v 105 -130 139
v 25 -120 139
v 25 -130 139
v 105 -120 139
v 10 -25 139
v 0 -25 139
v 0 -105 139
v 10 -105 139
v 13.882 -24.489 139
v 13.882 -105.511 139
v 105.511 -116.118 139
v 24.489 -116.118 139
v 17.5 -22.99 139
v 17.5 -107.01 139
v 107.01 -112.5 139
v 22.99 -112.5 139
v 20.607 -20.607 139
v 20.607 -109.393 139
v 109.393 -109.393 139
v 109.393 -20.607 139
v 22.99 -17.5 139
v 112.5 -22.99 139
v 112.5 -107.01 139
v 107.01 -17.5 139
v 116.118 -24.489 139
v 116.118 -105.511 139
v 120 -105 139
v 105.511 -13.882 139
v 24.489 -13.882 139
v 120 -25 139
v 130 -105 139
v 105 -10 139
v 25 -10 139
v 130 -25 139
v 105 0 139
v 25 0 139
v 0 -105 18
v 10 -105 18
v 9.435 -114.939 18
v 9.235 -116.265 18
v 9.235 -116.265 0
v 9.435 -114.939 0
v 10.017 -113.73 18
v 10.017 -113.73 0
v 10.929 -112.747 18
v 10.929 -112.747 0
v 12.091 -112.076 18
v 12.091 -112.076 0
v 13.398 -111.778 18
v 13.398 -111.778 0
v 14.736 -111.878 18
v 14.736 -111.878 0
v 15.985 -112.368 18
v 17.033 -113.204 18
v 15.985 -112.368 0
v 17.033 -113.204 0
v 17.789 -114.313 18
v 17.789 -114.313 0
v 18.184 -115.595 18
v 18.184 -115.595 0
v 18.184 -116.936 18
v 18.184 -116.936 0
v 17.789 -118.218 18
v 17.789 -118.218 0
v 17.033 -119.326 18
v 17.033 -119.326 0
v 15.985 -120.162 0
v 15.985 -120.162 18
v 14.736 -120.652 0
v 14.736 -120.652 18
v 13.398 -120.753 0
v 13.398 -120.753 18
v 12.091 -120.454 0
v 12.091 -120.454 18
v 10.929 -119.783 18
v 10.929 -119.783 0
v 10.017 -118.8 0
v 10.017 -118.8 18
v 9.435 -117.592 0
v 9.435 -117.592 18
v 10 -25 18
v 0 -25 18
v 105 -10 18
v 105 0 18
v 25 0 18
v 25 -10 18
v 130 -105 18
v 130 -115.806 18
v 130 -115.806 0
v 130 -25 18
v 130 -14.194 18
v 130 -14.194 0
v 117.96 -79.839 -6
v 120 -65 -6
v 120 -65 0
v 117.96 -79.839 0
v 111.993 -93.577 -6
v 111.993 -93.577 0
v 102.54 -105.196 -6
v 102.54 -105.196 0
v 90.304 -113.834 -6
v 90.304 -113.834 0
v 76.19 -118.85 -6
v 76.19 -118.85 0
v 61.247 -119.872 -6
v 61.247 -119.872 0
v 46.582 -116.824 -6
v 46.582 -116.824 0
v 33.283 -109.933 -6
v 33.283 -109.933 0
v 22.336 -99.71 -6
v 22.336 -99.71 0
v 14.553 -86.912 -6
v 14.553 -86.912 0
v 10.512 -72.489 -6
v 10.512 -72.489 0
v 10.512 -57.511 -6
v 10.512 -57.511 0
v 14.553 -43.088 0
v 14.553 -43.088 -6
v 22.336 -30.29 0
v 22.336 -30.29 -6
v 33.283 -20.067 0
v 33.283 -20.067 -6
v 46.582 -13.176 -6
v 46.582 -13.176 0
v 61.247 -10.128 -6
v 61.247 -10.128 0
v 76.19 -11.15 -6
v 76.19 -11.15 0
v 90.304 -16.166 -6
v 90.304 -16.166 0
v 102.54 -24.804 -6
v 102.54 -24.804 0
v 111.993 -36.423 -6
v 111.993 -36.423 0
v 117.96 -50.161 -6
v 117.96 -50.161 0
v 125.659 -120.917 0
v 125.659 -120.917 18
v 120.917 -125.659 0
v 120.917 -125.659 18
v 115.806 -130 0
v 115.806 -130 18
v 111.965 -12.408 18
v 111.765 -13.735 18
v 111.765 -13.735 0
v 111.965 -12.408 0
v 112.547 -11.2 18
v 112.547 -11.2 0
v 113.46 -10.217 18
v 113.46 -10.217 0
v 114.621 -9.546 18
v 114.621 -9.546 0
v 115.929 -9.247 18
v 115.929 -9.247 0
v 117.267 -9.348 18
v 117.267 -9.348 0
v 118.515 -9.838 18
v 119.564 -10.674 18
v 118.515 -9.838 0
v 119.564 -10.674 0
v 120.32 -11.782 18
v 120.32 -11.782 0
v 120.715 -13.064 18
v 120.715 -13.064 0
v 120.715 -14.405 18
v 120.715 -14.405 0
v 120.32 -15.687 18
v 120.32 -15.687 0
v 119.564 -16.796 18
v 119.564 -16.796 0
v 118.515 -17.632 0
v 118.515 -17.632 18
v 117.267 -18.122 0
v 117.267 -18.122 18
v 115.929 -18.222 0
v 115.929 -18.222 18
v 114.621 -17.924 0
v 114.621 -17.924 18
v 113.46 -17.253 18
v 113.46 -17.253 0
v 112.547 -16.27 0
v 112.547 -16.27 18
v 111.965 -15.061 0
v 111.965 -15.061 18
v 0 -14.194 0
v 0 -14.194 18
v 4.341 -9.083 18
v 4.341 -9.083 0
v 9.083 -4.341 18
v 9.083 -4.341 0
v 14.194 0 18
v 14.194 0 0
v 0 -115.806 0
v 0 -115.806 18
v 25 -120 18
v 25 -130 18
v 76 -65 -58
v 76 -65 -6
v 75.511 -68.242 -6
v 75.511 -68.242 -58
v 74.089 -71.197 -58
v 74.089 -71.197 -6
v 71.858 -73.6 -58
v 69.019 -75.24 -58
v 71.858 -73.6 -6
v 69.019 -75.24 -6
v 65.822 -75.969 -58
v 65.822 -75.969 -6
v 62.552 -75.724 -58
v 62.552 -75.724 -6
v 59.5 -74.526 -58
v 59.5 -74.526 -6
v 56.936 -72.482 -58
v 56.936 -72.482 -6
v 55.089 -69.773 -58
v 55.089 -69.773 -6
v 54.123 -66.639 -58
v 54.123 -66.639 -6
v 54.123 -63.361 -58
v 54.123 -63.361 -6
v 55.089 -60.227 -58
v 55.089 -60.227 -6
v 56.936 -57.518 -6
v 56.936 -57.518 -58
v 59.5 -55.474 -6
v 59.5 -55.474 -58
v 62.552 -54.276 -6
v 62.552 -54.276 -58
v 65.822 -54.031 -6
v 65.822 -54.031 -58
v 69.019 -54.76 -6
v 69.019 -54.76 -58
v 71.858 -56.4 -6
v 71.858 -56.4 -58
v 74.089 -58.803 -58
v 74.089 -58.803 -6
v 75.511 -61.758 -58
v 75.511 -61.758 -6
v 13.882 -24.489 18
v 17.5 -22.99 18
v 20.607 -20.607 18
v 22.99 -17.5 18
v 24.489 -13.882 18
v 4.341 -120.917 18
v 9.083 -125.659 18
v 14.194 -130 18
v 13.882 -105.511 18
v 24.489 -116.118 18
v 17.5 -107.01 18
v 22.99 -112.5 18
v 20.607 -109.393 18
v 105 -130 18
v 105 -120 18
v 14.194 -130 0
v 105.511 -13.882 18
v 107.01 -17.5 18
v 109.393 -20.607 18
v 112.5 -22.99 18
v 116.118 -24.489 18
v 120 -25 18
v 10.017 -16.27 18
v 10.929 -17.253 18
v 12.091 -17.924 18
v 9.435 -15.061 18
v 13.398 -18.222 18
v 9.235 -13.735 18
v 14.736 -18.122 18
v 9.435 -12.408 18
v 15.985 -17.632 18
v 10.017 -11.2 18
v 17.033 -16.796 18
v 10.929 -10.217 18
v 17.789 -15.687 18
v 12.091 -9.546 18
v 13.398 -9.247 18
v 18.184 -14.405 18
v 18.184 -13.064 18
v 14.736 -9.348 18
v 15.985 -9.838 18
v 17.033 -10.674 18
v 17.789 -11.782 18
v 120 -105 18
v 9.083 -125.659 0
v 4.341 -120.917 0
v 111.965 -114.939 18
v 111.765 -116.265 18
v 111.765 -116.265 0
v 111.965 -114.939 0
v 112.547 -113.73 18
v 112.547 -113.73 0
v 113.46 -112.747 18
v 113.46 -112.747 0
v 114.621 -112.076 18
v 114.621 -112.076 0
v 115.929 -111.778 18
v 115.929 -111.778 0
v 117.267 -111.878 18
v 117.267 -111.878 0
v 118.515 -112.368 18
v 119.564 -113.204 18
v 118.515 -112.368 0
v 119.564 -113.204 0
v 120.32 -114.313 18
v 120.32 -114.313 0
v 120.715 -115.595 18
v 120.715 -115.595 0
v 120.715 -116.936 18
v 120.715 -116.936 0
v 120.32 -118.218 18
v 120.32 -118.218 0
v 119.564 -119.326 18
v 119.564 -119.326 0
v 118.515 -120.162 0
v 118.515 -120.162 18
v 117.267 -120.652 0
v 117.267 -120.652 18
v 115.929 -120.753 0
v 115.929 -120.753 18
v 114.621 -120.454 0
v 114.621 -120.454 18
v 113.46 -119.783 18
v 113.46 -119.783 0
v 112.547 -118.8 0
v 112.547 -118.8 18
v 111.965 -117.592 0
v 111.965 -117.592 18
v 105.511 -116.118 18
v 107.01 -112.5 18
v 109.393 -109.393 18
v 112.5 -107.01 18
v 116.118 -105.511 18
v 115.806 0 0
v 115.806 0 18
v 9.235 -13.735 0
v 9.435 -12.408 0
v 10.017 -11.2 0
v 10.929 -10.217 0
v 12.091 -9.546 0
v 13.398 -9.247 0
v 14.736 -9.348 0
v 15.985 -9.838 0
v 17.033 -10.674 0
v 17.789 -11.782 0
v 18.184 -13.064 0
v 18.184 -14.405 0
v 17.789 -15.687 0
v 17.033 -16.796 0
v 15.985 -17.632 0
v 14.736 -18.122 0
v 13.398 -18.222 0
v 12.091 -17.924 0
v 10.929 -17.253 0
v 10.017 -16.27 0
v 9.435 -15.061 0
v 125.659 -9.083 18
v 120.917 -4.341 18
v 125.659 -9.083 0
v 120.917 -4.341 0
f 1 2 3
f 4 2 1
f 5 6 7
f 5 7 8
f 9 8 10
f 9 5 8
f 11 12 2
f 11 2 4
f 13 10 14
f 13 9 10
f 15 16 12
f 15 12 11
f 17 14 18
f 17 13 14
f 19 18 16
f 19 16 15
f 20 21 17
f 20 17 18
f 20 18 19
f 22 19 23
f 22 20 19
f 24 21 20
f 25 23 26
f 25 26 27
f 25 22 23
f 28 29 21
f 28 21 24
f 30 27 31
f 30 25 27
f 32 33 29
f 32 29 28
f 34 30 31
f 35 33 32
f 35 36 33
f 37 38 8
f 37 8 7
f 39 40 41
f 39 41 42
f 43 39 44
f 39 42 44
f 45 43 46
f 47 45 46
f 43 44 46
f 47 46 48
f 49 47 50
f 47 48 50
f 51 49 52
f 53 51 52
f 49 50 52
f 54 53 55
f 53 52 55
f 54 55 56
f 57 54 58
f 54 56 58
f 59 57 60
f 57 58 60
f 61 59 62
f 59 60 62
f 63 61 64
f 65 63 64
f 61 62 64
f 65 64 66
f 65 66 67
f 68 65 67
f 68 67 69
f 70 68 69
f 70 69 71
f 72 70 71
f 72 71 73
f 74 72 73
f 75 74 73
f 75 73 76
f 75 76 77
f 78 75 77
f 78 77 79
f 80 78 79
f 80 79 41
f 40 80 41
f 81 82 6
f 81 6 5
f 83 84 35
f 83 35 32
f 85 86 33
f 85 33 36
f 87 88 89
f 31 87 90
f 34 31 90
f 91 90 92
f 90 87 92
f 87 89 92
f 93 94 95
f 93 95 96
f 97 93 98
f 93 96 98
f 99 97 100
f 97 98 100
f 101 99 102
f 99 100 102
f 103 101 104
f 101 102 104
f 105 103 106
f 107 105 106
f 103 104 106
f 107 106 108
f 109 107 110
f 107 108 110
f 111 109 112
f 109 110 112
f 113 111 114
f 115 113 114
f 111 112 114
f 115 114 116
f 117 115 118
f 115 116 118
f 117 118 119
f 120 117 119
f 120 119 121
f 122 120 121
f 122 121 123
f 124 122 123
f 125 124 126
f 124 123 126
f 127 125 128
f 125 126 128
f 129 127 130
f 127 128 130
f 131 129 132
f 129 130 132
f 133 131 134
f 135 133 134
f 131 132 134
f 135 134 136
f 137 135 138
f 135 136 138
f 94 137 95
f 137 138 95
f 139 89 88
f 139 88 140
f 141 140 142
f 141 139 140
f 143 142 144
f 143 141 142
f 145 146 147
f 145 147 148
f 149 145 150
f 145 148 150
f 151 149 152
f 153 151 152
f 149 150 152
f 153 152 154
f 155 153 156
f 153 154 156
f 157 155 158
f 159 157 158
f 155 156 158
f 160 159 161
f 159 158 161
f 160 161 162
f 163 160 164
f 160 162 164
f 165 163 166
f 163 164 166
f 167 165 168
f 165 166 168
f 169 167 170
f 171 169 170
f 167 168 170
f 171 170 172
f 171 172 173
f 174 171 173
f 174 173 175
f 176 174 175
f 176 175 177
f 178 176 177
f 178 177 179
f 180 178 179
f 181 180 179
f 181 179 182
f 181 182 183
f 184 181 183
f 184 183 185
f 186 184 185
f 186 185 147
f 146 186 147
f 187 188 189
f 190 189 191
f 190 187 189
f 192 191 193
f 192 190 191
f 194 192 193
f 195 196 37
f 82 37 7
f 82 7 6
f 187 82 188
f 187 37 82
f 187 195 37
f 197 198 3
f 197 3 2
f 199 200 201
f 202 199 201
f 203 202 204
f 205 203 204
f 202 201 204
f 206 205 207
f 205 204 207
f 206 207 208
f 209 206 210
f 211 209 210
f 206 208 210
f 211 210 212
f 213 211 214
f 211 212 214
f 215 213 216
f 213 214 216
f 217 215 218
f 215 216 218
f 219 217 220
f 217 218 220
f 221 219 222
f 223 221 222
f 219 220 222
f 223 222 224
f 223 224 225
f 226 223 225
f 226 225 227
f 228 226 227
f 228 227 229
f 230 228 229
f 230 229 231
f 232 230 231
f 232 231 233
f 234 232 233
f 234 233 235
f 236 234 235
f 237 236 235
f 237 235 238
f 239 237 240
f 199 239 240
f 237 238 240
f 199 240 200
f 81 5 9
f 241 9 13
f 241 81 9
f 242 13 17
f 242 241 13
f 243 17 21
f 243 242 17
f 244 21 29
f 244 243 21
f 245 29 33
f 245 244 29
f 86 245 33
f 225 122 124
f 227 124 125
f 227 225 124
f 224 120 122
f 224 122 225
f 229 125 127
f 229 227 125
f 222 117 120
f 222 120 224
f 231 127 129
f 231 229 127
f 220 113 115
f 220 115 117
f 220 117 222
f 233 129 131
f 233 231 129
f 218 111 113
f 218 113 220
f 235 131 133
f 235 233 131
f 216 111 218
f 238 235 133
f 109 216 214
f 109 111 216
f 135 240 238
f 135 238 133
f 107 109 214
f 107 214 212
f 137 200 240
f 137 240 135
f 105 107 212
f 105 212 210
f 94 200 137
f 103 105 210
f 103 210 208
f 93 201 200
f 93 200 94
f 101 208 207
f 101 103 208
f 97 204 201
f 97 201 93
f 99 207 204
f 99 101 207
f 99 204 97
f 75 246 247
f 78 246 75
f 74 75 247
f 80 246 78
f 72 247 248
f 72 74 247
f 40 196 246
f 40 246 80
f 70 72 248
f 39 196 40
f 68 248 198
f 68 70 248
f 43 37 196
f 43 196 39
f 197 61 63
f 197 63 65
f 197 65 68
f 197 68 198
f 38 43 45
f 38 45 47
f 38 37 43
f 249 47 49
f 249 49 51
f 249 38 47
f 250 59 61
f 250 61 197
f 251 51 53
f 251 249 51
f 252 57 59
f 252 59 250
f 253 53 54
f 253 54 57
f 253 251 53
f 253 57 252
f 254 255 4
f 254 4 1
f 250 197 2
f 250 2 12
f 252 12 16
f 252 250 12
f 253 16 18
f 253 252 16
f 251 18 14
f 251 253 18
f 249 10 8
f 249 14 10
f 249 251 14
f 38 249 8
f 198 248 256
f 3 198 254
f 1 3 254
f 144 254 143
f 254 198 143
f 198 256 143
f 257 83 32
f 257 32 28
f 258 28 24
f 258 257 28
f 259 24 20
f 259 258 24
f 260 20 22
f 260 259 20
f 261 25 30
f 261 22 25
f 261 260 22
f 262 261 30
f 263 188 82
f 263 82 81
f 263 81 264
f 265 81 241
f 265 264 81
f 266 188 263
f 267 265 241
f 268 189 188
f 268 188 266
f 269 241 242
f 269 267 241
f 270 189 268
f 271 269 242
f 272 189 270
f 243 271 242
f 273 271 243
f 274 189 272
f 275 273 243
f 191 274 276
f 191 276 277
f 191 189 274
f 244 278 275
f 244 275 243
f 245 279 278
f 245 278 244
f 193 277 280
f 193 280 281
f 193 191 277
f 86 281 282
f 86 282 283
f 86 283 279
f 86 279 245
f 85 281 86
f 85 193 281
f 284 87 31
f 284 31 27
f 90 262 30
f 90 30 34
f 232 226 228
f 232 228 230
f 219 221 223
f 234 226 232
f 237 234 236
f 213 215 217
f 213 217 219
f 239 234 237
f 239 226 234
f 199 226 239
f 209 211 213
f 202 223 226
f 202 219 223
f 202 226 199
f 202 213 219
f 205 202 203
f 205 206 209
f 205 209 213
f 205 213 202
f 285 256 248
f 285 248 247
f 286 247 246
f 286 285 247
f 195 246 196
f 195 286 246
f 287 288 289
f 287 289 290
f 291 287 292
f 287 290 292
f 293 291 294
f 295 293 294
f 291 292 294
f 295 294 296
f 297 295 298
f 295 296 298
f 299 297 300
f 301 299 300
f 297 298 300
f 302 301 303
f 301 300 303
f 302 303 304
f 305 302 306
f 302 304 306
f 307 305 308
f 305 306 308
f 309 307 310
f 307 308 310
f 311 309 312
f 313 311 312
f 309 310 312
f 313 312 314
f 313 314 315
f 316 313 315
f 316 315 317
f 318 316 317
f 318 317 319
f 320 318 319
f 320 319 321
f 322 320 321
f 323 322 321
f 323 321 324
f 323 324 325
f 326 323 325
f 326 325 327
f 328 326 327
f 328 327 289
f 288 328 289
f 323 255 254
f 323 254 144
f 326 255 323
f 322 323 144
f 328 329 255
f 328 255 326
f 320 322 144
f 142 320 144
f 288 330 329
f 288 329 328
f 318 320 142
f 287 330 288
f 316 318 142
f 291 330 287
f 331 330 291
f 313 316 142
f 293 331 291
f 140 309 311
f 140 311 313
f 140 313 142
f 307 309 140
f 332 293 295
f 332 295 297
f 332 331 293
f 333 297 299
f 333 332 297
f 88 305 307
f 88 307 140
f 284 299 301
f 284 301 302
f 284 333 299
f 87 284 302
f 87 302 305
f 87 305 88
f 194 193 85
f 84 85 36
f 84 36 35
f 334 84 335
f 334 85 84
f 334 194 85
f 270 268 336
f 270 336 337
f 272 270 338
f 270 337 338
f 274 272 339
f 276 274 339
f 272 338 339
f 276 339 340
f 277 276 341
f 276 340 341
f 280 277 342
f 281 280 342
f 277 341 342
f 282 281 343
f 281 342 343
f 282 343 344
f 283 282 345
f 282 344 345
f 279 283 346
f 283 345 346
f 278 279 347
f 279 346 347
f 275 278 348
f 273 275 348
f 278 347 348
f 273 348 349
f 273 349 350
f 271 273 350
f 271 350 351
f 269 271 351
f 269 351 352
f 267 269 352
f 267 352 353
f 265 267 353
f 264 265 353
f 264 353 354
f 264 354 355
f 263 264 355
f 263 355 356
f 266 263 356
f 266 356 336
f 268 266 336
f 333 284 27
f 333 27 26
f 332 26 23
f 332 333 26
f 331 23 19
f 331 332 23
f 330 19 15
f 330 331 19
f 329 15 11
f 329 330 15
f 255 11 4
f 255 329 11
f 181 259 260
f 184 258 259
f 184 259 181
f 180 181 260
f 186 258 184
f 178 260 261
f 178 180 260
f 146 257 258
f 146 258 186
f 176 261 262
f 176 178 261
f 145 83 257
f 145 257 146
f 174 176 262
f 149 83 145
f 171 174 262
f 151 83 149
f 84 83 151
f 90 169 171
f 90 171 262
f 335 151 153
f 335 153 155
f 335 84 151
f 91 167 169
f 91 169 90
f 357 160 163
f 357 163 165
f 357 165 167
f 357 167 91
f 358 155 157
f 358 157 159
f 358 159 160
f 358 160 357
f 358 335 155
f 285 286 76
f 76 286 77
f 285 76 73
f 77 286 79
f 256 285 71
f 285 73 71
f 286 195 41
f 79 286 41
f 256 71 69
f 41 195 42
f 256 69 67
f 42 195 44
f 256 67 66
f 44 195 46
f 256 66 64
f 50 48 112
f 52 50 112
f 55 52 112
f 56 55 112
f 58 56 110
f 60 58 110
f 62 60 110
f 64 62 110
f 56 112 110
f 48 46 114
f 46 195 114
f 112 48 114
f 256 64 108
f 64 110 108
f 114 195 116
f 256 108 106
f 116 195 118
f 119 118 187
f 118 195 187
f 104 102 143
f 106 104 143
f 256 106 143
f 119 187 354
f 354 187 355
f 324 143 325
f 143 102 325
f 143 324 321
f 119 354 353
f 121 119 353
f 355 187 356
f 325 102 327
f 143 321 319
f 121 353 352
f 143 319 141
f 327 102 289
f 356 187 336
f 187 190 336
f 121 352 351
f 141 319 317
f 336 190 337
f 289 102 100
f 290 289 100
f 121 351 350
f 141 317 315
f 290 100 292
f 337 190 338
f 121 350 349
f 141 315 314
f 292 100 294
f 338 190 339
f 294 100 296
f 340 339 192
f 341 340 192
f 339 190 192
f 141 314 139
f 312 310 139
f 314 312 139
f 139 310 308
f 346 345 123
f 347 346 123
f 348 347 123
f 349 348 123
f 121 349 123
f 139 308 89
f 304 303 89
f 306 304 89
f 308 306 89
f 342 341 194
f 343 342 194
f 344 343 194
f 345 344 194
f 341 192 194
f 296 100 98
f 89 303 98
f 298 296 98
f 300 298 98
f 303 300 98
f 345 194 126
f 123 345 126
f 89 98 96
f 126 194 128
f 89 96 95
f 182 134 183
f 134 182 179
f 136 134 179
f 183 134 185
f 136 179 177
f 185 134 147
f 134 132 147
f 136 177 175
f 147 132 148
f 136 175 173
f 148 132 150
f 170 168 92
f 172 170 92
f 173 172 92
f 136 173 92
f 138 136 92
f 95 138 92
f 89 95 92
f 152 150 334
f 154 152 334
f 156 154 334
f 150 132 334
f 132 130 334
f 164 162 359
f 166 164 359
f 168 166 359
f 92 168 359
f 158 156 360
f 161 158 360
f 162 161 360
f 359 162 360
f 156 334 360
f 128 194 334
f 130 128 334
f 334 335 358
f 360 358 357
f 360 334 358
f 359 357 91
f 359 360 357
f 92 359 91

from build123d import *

# Parameters (mm, degrees)
SKETCH_1_W          = 130
SKETCH_1_H          = 130
EXTRUDE_1_DEPTH     = 139
SKETCH_2_R          = 55
EXTRUDE_2_DEPTH     = 6
SKETCH_3_R          = 11
EXTRUDE_3_DEPTH     = 52
SKETCH_5_R          = 4.5
CUT_EXTRUDE_2_DEPTH = 137
CUT_EXTRUDE_5_DEPTH = 221.093162093
SKETCH_10_OUTSIDE_W = 185.892
SKETCH_10_OUTSIDE_H = 185.892
SKETCH_10_OUTSIDE_R = 82.5
CUT_EXTRUDE_6_DEPTH = 231.479934051


with BuildPart() as part:
    # 草图1 → 拉伸1 (new body)
    with BuildSketch(Plane.XY):
        with Locations((65, -65)):
            Rectangle(SKETCH_1_W, SKETCH_1_H)
    extrude(amount=EXTRUDE_1_DEPTH)

    # 草图2 → 拉伸2 (add)
    with BuildSketch(Plane(origin=(0, 0, 0), x_dir=(-1, 0, 0), z_dir=(0, 0, -1))):
        with Locations(Location((-65, -65, 0), (0, 0, 180))):
            Circle(SKETCH_2_R)
    extrude(amount=EXTRUDE_2_DEPTH)

    # 草图3 → 拉伸3 (add)
    with BuildSketch(Plane(origin=(0, 0, -6), x_dir=(-1, 0, 0), z_dir=(0, 0, -1))):
        with Locations(Location((-65, -65, 0), (0, 0, 180))):
            Circle(SKETCH_3_R)
    extrude(amount=EXTRUDE_3_DEPTH)

    # 草图5 → 切除-拉伸2 (cut)
    with BuildSketch(Plane(origin=(0, 0, 0), x_dir=(-1, 0, 0), z_dir=(0, 0, -1))):
        with Locations((-13.734758364, -13.734758364)):
            Circle(SKETCH_5_R)
        with Locations((-13.734758364, -116.265241636)):
            Circle(SKETCH_5_R)
        with Locations((-116.265241636, -116.265241636)):
            Circle(SKETCH_5_R)
        with Locations((-116.265241636, -13.734758364)):
            Circle(SKETCH_5_R)
    extrude(amount=-CUT_EXTRUDE_2_DEPTH, mode=Mode.SUBTRACT)

    # 草图7 → 切除-拉伸5 (cut, through all)
    with BuildSketch(Plane(origin=(0, 0, 18), x_dir=(-1, 0, 0), z_dir=(0, 0, -1))):
        with BuildLine():
            Line((-130, 0), (-105, 0))
            Line((-105, 0), (-105, -10))
            ThreePointArc((-105, -10), (-109.393398282, -20.606601718), (-120, -25))
            Line((-120, -25), (-130, -25))
            Line((-130, -25), (-130, 0))
        make_face()
        with BuildLine():
            Line((0, 0), (0, -25))
            Line((0, -25), (-10, -25))
            ThreePointArc((-10, -25), (-20.606601718, -20.606601718), (-25, -10))
            Line((-25, -10), (-25, 0))
            Line((-25, 0), (0, 0))
        make_face()
        with BuildLine():
            Line((0, -130), (-25, -130))
            Line((-25, -130), (-25, -120))
            ThreePointArc((-25, -120), (-20.606601718, -109.393398282), (-10, -105))
            Line((-10, -105), (0, -105))
            Line((0, -105), (0, -130))
        make_face()
        with BuildLine():
            Line((-130, -130), (-130, -105))
            Line((-130, -105), (-120, -105))
            ThreePointArc((-120, -105), (-109.393398282, -109.393398282), (-105, -120))
            Line((-105, -120), (-105, -130))
            Line((-105, -130), (-130, -130))
        make_face()
    extrude(amount=-CUT_EXTRUDE_5_DEPTH, mode=Mode.SUBTRACT)

    # 草图10 outside → 切除-拉伸6 (cut, through all)
    with BuildSketch(Plane(origin=(0, 0, 0), x_dir=(-1, 0, 0), z_dir=(0, 0, -1))):
        with Locations((-65, -65)):
            Rectangle(SKETCH_10_OUTSIDE_W, SKETCH_10_OUTSIDE_H)
        with Locations((-65, -65)):
            Circle(SKETCH_10_OUTSIDE_R, mode=Mode.SUBTRACT)
    extrude(amount=-CUT_EXTRUDE_6_DEPTH, mode=Mode.SUBTRACT)


solid = part.part
